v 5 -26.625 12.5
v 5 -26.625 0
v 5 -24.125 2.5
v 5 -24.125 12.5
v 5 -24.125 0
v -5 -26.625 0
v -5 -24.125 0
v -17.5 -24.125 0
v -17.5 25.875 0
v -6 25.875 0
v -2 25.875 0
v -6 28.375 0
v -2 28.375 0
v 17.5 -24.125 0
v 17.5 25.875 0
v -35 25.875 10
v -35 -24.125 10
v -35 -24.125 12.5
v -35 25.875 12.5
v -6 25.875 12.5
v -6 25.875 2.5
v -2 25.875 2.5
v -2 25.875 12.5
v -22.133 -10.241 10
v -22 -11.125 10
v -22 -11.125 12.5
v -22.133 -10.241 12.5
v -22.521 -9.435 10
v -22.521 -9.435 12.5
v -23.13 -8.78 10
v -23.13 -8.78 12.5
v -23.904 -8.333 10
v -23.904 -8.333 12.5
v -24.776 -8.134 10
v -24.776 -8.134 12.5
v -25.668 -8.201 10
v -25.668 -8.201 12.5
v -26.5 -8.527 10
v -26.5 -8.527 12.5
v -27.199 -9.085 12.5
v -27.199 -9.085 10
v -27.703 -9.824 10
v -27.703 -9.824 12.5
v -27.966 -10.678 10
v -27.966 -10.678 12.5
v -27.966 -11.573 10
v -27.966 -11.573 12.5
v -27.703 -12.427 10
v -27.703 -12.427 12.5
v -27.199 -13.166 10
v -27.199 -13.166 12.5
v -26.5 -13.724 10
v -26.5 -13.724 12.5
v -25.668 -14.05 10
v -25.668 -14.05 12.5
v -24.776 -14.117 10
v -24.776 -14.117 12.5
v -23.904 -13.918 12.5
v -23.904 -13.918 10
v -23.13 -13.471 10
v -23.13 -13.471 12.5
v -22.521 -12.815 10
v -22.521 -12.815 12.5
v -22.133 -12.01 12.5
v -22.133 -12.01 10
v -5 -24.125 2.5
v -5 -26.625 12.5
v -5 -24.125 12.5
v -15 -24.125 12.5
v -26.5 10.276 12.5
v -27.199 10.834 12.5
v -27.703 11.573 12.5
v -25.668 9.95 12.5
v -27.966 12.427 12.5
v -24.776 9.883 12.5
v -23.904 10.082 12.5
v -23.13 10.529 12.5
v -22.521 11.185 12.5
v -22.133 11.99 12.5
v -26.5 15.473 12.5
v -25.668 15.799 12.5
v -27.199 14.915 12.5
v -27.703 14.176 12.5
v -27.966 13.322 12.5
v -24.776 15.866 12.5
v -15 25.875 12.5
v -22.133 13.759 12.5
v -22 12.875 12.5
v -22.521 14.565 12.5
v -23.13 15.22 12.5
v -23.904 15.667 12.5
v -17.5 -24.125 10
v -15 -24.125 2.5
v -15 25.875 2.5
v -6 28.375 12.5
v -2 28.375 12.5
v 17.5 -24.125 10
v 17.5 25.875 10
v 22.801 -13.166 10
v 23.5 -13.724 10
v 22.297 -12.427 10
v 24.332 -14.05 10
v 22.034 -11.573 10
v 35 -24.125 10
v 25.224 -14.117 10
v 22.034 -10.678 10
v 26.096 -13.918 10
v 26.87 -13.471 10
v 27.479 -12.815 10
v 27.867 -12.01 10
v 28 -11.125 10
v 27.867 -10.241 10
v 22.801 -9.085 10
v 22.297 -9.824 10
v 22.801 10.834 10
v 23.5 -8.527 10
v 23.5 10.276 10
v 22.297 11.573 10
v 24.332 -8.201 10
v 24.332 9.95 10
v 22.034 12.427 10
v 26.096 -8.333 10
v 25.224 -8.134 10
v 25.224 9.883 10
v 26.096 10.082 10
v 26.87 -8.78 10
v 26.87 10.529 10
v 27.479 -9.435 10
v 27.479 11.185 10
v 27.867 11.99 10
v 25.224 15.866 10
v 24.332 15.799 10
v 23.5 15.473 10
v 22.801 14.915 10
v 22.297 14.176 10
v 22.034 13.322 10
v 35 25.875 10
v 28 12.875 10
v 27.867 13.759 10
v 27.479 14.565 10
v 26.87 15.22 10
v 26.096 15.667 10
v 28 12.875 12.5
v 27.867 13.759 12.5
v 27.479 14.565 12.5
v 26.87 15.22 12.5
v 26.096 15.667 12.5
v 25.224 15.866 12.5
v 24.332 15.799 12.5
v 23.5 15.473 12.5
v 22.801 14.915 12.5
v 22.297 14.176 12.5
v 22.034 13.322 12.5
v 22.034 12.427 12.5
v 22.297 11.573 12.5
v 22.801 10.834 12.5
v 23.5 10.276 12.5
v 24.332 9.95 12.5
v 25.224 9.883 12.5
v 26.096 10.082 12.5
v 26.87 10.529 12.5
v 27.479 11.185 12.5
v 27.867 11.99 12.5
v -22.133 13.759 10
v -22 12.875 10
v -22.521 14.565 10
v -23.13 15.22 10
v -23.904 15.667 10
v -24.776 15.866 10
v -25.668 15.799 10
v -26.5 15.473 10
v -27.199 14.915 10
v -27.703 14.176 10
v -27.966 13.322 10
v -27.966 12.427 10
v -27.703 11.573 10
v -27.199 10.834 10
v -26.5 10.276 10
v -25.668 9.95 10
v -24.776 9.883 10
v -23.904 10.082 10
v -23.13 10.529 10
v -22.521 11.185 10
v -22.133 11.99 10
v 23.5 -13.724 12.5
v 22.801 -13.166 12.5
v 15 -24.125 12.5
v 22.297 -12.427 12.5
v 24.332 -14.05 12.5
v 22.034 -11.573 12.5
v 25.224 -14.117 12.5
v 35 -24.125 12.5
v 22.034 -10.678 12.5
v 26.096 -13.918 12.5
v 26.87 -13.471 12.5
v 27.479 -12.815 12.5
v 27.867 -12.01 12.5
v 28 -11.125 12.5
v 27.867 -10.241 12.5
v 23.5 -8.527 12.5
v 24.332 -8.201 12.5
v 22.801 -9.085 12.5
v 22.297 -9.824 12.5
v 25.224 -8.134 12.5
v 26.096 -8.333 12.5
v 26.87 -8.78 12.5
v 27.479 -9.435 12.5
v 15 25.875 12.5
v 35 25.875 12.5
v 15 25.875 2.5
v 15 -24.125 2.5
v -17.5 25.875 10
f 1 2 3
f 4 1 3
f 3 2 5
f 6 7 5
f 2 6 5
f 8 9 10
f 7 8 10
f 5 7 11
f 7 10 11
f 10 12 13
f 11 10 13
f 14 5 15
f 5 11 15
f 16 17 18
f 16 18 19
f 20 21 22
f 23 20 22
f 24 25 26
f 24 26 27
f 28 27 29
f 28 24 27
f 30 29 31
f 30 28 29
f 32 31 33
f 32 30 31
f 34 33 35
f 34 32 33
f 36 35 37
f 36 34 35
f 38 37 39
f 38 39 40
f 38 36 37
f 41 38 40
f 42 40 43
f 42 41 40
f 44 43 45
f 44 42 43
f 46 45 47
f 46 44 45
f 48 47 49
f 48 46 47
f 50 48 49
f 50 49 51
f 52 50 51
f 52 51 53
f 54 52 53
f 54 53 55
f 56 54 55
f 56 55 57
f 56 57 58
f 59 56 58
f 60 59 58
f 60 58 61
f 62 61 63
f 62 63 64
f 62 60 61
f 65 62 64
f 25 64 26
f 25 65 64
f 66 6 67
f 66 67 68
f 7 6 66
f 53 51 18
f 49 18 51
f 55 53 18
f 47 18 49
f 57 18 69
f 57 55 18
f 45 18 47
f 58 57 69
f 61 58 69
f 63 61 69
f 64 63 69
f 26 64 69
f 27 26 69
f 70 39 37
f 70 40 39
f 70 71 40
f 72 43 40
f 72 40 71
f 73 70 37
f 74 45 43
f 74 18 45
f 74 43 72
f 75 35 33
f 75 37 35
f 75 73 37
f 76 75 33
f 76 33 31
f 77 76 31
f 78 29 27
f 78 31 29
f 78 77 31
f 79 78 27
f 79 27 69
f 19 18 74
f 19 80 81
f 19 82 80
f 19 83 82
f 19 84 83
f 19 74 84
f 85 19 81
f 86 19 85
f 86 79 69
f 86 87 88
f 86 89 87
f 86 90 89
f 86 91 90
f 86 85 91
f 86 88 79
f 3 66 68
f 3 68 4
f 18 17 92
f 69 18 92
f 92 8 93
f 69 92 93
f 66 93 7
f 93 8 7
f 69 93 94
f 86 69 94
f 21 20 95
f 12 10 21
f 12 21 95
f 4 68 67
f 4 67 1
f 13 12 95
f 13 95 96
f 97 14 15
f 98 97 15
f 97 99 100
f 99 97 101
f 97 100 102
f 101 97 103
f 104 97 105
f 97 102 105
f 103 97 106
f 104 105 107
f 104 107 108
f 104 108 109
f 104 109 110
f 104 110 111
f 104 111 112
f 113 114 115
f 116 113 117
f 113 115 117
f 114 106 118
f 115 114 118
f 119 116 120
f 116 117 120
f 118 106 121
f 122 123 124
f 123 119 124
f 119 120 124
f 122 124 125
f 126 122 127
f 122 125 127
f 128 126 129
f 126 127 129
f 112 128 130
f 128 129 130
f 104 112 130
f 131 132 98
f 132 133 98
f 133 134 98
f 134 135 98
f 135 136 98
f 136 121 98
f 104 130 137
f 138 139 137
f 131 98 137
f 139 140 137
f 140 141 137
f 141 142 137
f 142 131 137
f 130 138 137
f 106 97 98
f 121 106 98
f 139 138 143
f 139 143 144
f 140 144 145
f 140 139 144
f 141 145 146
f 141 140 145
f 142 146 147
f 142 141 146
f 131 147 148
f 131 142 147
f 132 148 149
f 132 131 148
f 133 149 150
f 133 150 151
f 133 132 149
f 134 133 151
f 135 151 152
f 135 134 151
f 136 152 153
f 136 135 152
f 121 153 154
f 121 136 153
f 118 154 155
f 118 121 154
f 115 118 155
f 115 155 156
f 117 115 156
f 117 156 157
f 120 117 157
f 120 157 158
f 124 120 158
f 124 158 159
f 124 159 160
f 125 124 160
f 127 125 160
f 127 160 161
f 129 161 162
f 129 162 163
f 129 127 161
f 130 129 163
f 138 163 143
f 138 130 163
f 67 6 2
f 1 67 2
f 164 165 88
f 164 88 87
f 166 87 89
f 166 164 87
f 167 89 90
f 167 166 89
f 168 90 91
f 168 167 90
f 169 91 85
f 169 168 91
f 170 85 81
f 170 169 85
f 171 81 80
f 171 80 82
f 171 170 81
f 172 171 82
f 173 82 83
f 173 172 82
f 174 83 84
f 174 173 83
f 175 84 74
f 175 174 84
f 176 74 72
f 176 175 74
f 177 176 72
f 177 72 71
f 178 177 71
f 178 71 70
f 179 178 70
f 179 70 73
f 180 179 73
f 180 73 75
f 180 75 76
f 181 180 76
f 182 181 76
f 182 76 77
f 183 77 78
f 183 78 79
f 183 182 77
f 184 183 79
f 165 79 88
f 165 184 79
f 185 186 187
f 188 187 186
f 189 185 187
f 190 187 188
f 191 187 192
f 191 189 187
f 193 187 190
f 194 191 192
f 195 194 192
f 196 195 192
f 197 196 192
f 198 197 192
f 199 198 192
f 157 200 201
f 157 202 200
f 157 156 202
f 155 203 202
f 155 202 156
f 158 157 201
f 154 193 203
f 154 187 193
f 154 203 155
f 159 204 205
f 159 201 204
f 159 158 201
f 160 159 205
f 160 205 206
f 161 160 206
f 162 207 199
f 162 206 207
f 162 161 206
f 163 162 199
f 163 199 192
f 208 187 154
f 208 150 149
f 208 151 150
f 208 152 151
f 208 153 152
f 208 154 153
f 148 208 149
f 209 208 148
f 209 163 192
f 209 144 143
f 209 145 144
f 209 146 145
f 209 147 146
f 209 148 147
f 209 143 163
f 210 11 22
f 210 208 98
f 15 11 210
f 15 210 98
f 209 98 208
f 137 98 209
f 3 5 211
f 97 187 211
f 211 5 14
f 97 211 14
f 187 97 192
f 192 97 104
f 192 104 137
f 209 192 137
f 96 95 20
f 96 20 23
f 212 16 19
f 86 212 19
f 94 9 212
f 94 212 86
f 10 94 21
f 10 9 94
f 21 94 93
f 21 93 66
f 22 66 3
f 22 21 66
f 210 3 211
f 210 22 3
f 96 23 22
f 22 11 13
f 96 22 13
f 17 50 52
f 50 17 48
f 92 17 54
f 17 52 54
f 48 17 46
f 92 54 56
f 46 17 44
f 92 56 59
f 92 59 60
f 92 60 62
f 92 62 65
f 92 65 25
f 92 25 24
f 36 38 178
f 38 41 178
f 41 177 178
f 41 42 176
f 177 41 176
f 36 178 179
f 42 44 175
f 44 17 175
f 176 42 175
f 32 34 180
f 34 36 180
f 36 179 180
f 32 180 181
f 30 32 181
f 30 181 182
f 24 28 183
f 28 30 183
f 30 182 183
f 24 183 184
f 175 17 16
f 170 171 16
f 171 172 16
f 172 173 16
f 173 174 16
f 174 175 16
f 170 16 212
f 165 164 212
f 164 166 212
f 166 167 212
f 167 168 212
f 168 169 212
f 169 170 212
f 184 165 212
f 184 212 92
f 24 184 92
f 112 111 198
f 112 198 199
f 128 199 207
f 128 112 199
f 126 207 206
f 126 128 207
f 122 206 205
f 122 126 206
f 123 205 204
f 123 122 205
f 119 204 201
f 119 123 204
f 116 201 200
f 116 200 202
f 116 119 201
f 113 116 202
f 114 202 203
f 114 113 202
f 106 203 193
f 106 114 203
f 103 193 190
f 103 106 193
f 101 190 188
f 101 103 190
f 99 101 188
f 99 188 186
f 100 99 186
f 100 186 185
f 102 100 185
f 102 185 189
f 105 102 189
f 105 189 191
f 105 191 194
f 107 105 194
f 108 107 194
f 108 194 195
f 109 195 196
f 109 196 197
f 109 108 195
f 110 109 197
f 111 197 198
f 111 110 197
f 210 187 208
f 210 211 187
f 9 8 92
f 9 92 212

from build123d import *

# Parameters (mm, degrees)
F0_W     = 30
F0_H     = 50
F1_DEPTH = 2.5
F2_W     = 2.5
F2_H     = 50
F3_DEPTH = 10
F4_W     = 20
F4_H     = 50
F4_R     = 3
F5_DEPTH = 2.5
F6_W     = 4
F6_H     = 2.5
F7_DEPTH = 12.5
F8_W     = 10
F8_H     = 2.5
F9_DEPTH = 12.5


with BuildPart() as f1:
    # F0 (on Top) → F1 (new body)
    with BuildSketch(Plane.XY):
        with Locations((0, 0.874573)):
            Rectangle(F0_W, F0_H)
    extrude(amount=F1_DEPTH)

    # F2 (on Top) → F3 (join)
    with BuildSketch(Plane.XY):
        with Locations((16.25, 0.874573)):
            Rectangle(F2_W, F2_H)
        with Locations((-16.25, 0.874573)):
            Rectangle(F2_W, F2_H)
    extrude(amount=F3_DEPTH)

    # F4 (on face) → F5 (join)
    with BuildSketch(Plane.XY.offset(10)):
        with Locations((25, 0.874573)):
            Rectangle(F4_W, F4_H)
        with Locations((25, -11.125427)):
            Circle(F4_R, mode=Mode.SUBTRACT)
        with Locations((25, 12.874573)):
            Circle(F4_R, mode=Mode.SUBTRACT)
        with Locations((-25, 0.874573)):
            Rectangle(F4_W, F4_H)
        with Locations((-25, -11.125427)):
            Circle(F4_R, mode=Mode.SUBTRACT)
        with Locations((-25, 12.874573)):
            Circle(F4_R, mode=Mode.SUBTRACT)
    extrude(amount=F5_DEPTH)

    # F6 (on Top) → F7 (join, through all)
    with BuildSketch(Plane.XY):
        with Locations((-4, 27.124573)):
            Rectangle(F6_W, F6_H)
    extrude(amount=F7_DEPTH)

    # F8 (on Top) → F9 (join, through all)
    with BuildSketch(Plane.XY):
        with Locations((0, -25.375427)):
            Rectangle(F8_W, F8_H)
    extrude(amount=F9_DEPTH)


solid = f1.part
